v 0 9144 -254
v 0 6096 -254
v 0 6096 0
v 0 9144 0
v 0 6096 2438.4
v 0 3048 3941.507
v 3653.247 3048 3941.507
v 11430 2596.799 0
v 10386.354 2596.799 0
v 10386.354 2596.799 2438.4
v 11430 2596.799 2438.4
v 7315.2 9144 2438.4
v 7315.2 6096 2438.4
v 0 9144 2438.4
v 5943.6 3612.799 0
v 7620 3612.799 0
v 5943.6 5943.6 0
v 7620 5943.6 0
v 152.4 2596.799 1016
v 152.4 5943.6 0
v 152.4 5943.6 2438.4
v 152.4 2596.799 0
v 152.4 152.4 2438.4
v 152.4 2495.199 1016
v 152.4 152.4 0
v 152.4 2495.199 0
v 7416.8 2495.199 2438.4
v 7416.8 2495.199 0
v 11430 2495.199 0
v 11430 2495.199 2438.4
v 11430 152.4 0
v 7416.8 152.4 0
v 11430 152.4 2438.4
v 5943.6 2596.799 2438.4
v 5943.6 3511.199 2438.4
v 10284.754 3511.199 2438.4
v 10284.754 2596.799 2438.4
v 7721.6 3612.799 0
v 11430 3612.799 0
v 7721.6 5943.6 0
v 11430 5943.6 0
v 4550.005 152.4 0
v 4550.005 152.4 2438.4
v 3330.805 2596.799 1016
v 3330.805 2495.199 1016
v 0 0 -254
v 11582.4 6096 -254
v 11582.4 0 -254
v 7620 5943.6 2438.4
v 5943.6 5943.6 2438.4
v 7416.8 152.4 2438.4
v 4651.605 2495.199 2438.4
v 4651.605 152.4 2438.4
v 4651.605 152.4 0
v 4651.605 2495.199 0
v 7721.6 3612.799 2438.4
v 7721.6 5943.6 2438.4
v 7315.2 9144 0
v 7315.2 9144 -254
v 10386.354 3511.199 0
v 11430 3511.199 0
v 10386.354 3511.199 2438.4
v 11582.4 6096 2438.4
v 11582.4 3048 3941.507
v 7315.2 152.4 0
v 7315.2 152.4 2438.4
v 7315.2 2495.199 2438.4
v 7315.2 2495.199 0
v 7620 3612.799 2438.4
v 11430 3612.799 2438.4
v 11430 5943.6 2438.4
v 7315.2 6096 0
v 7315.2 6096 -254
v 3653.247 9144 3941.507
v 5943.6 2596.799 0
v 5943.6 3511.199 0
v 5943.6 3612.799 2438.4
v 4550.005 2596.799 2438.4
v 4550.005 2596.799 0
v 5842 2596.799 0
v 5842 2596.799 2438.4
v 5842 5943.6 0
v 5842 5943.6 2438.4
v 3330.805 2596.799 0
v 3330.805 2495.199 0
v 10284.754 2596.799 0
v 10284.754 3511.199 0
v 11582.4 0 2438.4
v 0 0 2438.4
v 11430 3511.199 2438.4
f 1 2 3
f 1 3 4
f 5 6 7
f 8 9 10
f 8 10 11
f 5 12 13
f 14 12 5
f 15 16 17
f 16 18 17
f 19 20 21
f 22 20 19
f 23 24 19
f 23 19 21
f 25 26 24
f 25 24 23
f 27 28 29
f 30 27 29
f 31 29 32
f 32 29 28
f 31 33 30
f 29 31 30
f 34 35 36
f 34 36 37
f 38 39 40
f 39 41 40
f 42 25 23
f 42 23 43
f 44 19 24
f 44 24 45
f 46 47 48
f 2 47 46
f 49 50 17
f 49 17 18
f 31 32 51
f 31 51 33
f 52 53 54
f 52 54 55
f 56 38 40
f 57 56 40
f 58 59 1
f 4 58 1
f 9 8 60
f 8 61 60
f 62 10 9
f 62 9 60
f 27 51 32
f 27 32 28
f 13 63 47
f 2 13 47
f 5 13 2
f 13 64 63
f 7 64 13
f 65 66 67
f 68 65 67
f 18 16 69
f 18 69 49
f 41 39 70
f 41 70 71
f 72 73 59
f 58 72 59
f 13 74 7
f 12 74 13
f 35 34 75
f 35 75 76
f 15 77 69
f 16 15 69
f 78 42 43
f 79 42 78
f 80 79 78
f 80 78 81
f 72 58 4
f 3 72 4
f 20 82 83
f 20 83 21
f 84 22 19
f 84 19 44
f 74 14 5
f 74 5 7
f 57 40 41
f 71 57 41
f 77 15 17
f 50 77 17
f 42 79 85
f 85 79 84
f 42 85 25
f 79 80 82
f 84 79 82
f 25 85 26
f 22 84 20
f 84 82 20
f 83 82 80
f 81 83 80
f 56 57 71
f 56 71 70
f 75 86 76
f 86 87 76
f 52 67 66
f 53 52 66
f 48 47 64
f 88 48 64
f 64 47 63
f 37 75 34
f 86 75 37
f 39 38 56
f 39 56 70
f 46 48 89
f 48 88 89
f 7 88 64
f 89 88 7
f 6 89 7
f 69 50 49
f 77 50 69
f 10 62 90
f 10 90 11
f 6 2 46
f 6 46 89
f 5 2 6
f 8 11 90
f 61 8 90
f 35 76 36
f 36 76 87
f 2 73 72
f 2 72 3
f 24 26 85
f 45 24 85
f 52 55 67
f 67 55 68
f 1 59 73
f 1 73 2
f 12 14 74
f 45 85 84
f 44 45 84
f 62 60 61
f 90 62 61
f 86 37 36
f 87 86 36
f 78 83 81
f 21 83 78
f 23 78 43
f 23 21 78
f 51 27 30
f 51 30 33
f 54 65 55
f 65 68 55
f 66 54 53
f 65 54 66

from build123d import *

# Parameters (mm, degrees)
SKETCH3_W           = 11582.4
SKETCH3_H           = 6096
SKETCH3_W_2         = 4341.154286856
SKETCH3_H_2         = 914.4
SKETCH3_W_3         = 1676.4
SKETCH3_H_3         = 2330.801356814
SKETCH3_W_4         = 2663.595025017
SKETCH3_H_4         = 2342.798643186
SKETCH3_W_5         = 1043.645713144
SKETCH3_W_6         = 4013.2
SKETCH3_W_7         = 3708.4
BOSS_EXTRUDE1_DEPTH = 2438.4
SKETCH4_W           = 11582.4
SKETCH4_H           = 6096
BOSS_EXTRUDE2_DEPTH = 254
SKETCH5_W           = 3178.404974983
SKETCH5_H           = 101.6
BOSS_EXTRUDE3_DEPTH = 1016
BOSS_EXTRUDE4_DEPTH = 11582.4
SKETCH8_W           = 7315.2
SKETCH8_H           = 3048
BOSS_EXTRUDE6_DEPTH = 254
BOSS_EXTRUDE9_REACH = 9146


with BuildPart() as part:
    # Sketch3 → Boss-Extrude1 (new body)
    with BuildSketch(Plane.XY):
        with Locations((5791.2, 3048)):
            Rectangle(SKETCH3_W, SKETCH3_H)
        Polygon((152.4, 152.4), (4550.004974983, 152.4), (4550.004974983, 2596.798643186), (5842, 2596.798643186), (5842, 3511.198643186), (5842, 5943.6), (152.4, 5943.6), align=None, mode=Mode.SUBTRACT)
        with Locations((8114.177143428, 3053.998643186)):
            Rectangle(SKETCH3_W_2, SKETCH3_H_2, mode=Mode.SUBTRACT)
        with Locations((6781.8, 4778.199321593)):
            Rectangle(SKETCH3_W_3, SKETCH3_H_3, mode=Mode.SUBTRACT)
        with Locations((5983.402487492, 1323.799321593)):
            Rectangle(SKETCH3_W_4, SKETCH3_H_4, mode=Mode.SUBTRACT)
        with Locations((10908.177143428, 3053.998643186)):
            Rectangle(SKETCH3_W_5, SKETCH3_H_2, mode=Mode.SUBTRACT)
        with Locations((9423.4, 1323.799321593)):
            Rectangle(SKETCH3_W_6, SKETCH3_H_4, mode=Mode.SUBTRACT)
        with Locations((9575.8, 4778.199321593)):
            Rectangle(SKETCH3_W_7, SKETCH3_H_3, mode=Mode.SUBTRACT)
    extrude(amount=BOSS_EXTRUDE1_DEPTH)

    # Sketch4 → Boss-Extrude2 (add)
    with BuildSketch(Plane(origin=(0, 0, 0), x_dir=(-1, 0, 0), z_dir=(0, 0, -1))):
        with Locations((-5791.2, 3048)):
            Rectangle(SKETCH4_W, SKETCH4_H)
    extrude(amount=BOSS_EXTRUDE2_DEPTH)

    # Sketch5 → Boss-Extrude3 (add)
    with BuildSketch(Plane.XY):
        with Locations((1741.602487492, 2545.998643186)):
            Rectangle(SKETCH5_W, SKETCH5_H)
    extrude(amount=BOSS_EXTRUDE3_DEPTH)

    # Sketch6 → Boss-Extrude4 (add)
    with BuildSketch(Plane.ZY):
        Polygon((2438.4, 6096), (2438.4, 0), (3941.507258543, 3048), align=None)
    extrude(amount=-BOSS_EXTRUDE4_DEPTH)

    # Boss-Extrude9: up to this face of the body (flat: up to its plane)
    boss_extrude9_end = Plane(part.part.faces().sort_by_distance((5791.2, 4572, 3189.953629272))[0])
    # Sketch10 → Boss-Extrude9 (add, up to the picked face)
    with BuildSketch(Plane(origin=(0, 9144, 0), x_dir=(1, 0, 0), z_dir=(0, 1, 0)), mode=Mode.PRIVATE) as boss_extrude9_sk1:
        Polygon((7315.2, -2438.4), (0, -2438.4), (3653.246788264, -3941.507258543), align=None)
    boss_extrude9_tool1 = split(extrude(boss_extrude9_sk1.sketch, amount=-BOSS_EXTRUDE9_REACH, mode=Mode.PRIVATE), bisect_by=boss_extrude9_end, keep=Keep.BOTH, mode=Mode.PRIVATE)
    add(boss_extrude9_tool1.solids().sort_by_distance((3656.148929, 9144, 2939.435753))[0])


with BuildPart() as body_2:
    # Sketch8 → Boss-Extrude6 (new body)
    with BuildSketch(Plane(origin=(0, 0, -254), x_dir=(-1, 0, 0), z_dir=(0, 0, -1))):
        with Locations((-3657.6, 7620)):
            Rectangle(SKETCH8_W, SKETCH8_H)
    extrude(amount=-BOSS_EXTRUDE6_DEPTH)


solid = Compound([part.part, body_2.part])
